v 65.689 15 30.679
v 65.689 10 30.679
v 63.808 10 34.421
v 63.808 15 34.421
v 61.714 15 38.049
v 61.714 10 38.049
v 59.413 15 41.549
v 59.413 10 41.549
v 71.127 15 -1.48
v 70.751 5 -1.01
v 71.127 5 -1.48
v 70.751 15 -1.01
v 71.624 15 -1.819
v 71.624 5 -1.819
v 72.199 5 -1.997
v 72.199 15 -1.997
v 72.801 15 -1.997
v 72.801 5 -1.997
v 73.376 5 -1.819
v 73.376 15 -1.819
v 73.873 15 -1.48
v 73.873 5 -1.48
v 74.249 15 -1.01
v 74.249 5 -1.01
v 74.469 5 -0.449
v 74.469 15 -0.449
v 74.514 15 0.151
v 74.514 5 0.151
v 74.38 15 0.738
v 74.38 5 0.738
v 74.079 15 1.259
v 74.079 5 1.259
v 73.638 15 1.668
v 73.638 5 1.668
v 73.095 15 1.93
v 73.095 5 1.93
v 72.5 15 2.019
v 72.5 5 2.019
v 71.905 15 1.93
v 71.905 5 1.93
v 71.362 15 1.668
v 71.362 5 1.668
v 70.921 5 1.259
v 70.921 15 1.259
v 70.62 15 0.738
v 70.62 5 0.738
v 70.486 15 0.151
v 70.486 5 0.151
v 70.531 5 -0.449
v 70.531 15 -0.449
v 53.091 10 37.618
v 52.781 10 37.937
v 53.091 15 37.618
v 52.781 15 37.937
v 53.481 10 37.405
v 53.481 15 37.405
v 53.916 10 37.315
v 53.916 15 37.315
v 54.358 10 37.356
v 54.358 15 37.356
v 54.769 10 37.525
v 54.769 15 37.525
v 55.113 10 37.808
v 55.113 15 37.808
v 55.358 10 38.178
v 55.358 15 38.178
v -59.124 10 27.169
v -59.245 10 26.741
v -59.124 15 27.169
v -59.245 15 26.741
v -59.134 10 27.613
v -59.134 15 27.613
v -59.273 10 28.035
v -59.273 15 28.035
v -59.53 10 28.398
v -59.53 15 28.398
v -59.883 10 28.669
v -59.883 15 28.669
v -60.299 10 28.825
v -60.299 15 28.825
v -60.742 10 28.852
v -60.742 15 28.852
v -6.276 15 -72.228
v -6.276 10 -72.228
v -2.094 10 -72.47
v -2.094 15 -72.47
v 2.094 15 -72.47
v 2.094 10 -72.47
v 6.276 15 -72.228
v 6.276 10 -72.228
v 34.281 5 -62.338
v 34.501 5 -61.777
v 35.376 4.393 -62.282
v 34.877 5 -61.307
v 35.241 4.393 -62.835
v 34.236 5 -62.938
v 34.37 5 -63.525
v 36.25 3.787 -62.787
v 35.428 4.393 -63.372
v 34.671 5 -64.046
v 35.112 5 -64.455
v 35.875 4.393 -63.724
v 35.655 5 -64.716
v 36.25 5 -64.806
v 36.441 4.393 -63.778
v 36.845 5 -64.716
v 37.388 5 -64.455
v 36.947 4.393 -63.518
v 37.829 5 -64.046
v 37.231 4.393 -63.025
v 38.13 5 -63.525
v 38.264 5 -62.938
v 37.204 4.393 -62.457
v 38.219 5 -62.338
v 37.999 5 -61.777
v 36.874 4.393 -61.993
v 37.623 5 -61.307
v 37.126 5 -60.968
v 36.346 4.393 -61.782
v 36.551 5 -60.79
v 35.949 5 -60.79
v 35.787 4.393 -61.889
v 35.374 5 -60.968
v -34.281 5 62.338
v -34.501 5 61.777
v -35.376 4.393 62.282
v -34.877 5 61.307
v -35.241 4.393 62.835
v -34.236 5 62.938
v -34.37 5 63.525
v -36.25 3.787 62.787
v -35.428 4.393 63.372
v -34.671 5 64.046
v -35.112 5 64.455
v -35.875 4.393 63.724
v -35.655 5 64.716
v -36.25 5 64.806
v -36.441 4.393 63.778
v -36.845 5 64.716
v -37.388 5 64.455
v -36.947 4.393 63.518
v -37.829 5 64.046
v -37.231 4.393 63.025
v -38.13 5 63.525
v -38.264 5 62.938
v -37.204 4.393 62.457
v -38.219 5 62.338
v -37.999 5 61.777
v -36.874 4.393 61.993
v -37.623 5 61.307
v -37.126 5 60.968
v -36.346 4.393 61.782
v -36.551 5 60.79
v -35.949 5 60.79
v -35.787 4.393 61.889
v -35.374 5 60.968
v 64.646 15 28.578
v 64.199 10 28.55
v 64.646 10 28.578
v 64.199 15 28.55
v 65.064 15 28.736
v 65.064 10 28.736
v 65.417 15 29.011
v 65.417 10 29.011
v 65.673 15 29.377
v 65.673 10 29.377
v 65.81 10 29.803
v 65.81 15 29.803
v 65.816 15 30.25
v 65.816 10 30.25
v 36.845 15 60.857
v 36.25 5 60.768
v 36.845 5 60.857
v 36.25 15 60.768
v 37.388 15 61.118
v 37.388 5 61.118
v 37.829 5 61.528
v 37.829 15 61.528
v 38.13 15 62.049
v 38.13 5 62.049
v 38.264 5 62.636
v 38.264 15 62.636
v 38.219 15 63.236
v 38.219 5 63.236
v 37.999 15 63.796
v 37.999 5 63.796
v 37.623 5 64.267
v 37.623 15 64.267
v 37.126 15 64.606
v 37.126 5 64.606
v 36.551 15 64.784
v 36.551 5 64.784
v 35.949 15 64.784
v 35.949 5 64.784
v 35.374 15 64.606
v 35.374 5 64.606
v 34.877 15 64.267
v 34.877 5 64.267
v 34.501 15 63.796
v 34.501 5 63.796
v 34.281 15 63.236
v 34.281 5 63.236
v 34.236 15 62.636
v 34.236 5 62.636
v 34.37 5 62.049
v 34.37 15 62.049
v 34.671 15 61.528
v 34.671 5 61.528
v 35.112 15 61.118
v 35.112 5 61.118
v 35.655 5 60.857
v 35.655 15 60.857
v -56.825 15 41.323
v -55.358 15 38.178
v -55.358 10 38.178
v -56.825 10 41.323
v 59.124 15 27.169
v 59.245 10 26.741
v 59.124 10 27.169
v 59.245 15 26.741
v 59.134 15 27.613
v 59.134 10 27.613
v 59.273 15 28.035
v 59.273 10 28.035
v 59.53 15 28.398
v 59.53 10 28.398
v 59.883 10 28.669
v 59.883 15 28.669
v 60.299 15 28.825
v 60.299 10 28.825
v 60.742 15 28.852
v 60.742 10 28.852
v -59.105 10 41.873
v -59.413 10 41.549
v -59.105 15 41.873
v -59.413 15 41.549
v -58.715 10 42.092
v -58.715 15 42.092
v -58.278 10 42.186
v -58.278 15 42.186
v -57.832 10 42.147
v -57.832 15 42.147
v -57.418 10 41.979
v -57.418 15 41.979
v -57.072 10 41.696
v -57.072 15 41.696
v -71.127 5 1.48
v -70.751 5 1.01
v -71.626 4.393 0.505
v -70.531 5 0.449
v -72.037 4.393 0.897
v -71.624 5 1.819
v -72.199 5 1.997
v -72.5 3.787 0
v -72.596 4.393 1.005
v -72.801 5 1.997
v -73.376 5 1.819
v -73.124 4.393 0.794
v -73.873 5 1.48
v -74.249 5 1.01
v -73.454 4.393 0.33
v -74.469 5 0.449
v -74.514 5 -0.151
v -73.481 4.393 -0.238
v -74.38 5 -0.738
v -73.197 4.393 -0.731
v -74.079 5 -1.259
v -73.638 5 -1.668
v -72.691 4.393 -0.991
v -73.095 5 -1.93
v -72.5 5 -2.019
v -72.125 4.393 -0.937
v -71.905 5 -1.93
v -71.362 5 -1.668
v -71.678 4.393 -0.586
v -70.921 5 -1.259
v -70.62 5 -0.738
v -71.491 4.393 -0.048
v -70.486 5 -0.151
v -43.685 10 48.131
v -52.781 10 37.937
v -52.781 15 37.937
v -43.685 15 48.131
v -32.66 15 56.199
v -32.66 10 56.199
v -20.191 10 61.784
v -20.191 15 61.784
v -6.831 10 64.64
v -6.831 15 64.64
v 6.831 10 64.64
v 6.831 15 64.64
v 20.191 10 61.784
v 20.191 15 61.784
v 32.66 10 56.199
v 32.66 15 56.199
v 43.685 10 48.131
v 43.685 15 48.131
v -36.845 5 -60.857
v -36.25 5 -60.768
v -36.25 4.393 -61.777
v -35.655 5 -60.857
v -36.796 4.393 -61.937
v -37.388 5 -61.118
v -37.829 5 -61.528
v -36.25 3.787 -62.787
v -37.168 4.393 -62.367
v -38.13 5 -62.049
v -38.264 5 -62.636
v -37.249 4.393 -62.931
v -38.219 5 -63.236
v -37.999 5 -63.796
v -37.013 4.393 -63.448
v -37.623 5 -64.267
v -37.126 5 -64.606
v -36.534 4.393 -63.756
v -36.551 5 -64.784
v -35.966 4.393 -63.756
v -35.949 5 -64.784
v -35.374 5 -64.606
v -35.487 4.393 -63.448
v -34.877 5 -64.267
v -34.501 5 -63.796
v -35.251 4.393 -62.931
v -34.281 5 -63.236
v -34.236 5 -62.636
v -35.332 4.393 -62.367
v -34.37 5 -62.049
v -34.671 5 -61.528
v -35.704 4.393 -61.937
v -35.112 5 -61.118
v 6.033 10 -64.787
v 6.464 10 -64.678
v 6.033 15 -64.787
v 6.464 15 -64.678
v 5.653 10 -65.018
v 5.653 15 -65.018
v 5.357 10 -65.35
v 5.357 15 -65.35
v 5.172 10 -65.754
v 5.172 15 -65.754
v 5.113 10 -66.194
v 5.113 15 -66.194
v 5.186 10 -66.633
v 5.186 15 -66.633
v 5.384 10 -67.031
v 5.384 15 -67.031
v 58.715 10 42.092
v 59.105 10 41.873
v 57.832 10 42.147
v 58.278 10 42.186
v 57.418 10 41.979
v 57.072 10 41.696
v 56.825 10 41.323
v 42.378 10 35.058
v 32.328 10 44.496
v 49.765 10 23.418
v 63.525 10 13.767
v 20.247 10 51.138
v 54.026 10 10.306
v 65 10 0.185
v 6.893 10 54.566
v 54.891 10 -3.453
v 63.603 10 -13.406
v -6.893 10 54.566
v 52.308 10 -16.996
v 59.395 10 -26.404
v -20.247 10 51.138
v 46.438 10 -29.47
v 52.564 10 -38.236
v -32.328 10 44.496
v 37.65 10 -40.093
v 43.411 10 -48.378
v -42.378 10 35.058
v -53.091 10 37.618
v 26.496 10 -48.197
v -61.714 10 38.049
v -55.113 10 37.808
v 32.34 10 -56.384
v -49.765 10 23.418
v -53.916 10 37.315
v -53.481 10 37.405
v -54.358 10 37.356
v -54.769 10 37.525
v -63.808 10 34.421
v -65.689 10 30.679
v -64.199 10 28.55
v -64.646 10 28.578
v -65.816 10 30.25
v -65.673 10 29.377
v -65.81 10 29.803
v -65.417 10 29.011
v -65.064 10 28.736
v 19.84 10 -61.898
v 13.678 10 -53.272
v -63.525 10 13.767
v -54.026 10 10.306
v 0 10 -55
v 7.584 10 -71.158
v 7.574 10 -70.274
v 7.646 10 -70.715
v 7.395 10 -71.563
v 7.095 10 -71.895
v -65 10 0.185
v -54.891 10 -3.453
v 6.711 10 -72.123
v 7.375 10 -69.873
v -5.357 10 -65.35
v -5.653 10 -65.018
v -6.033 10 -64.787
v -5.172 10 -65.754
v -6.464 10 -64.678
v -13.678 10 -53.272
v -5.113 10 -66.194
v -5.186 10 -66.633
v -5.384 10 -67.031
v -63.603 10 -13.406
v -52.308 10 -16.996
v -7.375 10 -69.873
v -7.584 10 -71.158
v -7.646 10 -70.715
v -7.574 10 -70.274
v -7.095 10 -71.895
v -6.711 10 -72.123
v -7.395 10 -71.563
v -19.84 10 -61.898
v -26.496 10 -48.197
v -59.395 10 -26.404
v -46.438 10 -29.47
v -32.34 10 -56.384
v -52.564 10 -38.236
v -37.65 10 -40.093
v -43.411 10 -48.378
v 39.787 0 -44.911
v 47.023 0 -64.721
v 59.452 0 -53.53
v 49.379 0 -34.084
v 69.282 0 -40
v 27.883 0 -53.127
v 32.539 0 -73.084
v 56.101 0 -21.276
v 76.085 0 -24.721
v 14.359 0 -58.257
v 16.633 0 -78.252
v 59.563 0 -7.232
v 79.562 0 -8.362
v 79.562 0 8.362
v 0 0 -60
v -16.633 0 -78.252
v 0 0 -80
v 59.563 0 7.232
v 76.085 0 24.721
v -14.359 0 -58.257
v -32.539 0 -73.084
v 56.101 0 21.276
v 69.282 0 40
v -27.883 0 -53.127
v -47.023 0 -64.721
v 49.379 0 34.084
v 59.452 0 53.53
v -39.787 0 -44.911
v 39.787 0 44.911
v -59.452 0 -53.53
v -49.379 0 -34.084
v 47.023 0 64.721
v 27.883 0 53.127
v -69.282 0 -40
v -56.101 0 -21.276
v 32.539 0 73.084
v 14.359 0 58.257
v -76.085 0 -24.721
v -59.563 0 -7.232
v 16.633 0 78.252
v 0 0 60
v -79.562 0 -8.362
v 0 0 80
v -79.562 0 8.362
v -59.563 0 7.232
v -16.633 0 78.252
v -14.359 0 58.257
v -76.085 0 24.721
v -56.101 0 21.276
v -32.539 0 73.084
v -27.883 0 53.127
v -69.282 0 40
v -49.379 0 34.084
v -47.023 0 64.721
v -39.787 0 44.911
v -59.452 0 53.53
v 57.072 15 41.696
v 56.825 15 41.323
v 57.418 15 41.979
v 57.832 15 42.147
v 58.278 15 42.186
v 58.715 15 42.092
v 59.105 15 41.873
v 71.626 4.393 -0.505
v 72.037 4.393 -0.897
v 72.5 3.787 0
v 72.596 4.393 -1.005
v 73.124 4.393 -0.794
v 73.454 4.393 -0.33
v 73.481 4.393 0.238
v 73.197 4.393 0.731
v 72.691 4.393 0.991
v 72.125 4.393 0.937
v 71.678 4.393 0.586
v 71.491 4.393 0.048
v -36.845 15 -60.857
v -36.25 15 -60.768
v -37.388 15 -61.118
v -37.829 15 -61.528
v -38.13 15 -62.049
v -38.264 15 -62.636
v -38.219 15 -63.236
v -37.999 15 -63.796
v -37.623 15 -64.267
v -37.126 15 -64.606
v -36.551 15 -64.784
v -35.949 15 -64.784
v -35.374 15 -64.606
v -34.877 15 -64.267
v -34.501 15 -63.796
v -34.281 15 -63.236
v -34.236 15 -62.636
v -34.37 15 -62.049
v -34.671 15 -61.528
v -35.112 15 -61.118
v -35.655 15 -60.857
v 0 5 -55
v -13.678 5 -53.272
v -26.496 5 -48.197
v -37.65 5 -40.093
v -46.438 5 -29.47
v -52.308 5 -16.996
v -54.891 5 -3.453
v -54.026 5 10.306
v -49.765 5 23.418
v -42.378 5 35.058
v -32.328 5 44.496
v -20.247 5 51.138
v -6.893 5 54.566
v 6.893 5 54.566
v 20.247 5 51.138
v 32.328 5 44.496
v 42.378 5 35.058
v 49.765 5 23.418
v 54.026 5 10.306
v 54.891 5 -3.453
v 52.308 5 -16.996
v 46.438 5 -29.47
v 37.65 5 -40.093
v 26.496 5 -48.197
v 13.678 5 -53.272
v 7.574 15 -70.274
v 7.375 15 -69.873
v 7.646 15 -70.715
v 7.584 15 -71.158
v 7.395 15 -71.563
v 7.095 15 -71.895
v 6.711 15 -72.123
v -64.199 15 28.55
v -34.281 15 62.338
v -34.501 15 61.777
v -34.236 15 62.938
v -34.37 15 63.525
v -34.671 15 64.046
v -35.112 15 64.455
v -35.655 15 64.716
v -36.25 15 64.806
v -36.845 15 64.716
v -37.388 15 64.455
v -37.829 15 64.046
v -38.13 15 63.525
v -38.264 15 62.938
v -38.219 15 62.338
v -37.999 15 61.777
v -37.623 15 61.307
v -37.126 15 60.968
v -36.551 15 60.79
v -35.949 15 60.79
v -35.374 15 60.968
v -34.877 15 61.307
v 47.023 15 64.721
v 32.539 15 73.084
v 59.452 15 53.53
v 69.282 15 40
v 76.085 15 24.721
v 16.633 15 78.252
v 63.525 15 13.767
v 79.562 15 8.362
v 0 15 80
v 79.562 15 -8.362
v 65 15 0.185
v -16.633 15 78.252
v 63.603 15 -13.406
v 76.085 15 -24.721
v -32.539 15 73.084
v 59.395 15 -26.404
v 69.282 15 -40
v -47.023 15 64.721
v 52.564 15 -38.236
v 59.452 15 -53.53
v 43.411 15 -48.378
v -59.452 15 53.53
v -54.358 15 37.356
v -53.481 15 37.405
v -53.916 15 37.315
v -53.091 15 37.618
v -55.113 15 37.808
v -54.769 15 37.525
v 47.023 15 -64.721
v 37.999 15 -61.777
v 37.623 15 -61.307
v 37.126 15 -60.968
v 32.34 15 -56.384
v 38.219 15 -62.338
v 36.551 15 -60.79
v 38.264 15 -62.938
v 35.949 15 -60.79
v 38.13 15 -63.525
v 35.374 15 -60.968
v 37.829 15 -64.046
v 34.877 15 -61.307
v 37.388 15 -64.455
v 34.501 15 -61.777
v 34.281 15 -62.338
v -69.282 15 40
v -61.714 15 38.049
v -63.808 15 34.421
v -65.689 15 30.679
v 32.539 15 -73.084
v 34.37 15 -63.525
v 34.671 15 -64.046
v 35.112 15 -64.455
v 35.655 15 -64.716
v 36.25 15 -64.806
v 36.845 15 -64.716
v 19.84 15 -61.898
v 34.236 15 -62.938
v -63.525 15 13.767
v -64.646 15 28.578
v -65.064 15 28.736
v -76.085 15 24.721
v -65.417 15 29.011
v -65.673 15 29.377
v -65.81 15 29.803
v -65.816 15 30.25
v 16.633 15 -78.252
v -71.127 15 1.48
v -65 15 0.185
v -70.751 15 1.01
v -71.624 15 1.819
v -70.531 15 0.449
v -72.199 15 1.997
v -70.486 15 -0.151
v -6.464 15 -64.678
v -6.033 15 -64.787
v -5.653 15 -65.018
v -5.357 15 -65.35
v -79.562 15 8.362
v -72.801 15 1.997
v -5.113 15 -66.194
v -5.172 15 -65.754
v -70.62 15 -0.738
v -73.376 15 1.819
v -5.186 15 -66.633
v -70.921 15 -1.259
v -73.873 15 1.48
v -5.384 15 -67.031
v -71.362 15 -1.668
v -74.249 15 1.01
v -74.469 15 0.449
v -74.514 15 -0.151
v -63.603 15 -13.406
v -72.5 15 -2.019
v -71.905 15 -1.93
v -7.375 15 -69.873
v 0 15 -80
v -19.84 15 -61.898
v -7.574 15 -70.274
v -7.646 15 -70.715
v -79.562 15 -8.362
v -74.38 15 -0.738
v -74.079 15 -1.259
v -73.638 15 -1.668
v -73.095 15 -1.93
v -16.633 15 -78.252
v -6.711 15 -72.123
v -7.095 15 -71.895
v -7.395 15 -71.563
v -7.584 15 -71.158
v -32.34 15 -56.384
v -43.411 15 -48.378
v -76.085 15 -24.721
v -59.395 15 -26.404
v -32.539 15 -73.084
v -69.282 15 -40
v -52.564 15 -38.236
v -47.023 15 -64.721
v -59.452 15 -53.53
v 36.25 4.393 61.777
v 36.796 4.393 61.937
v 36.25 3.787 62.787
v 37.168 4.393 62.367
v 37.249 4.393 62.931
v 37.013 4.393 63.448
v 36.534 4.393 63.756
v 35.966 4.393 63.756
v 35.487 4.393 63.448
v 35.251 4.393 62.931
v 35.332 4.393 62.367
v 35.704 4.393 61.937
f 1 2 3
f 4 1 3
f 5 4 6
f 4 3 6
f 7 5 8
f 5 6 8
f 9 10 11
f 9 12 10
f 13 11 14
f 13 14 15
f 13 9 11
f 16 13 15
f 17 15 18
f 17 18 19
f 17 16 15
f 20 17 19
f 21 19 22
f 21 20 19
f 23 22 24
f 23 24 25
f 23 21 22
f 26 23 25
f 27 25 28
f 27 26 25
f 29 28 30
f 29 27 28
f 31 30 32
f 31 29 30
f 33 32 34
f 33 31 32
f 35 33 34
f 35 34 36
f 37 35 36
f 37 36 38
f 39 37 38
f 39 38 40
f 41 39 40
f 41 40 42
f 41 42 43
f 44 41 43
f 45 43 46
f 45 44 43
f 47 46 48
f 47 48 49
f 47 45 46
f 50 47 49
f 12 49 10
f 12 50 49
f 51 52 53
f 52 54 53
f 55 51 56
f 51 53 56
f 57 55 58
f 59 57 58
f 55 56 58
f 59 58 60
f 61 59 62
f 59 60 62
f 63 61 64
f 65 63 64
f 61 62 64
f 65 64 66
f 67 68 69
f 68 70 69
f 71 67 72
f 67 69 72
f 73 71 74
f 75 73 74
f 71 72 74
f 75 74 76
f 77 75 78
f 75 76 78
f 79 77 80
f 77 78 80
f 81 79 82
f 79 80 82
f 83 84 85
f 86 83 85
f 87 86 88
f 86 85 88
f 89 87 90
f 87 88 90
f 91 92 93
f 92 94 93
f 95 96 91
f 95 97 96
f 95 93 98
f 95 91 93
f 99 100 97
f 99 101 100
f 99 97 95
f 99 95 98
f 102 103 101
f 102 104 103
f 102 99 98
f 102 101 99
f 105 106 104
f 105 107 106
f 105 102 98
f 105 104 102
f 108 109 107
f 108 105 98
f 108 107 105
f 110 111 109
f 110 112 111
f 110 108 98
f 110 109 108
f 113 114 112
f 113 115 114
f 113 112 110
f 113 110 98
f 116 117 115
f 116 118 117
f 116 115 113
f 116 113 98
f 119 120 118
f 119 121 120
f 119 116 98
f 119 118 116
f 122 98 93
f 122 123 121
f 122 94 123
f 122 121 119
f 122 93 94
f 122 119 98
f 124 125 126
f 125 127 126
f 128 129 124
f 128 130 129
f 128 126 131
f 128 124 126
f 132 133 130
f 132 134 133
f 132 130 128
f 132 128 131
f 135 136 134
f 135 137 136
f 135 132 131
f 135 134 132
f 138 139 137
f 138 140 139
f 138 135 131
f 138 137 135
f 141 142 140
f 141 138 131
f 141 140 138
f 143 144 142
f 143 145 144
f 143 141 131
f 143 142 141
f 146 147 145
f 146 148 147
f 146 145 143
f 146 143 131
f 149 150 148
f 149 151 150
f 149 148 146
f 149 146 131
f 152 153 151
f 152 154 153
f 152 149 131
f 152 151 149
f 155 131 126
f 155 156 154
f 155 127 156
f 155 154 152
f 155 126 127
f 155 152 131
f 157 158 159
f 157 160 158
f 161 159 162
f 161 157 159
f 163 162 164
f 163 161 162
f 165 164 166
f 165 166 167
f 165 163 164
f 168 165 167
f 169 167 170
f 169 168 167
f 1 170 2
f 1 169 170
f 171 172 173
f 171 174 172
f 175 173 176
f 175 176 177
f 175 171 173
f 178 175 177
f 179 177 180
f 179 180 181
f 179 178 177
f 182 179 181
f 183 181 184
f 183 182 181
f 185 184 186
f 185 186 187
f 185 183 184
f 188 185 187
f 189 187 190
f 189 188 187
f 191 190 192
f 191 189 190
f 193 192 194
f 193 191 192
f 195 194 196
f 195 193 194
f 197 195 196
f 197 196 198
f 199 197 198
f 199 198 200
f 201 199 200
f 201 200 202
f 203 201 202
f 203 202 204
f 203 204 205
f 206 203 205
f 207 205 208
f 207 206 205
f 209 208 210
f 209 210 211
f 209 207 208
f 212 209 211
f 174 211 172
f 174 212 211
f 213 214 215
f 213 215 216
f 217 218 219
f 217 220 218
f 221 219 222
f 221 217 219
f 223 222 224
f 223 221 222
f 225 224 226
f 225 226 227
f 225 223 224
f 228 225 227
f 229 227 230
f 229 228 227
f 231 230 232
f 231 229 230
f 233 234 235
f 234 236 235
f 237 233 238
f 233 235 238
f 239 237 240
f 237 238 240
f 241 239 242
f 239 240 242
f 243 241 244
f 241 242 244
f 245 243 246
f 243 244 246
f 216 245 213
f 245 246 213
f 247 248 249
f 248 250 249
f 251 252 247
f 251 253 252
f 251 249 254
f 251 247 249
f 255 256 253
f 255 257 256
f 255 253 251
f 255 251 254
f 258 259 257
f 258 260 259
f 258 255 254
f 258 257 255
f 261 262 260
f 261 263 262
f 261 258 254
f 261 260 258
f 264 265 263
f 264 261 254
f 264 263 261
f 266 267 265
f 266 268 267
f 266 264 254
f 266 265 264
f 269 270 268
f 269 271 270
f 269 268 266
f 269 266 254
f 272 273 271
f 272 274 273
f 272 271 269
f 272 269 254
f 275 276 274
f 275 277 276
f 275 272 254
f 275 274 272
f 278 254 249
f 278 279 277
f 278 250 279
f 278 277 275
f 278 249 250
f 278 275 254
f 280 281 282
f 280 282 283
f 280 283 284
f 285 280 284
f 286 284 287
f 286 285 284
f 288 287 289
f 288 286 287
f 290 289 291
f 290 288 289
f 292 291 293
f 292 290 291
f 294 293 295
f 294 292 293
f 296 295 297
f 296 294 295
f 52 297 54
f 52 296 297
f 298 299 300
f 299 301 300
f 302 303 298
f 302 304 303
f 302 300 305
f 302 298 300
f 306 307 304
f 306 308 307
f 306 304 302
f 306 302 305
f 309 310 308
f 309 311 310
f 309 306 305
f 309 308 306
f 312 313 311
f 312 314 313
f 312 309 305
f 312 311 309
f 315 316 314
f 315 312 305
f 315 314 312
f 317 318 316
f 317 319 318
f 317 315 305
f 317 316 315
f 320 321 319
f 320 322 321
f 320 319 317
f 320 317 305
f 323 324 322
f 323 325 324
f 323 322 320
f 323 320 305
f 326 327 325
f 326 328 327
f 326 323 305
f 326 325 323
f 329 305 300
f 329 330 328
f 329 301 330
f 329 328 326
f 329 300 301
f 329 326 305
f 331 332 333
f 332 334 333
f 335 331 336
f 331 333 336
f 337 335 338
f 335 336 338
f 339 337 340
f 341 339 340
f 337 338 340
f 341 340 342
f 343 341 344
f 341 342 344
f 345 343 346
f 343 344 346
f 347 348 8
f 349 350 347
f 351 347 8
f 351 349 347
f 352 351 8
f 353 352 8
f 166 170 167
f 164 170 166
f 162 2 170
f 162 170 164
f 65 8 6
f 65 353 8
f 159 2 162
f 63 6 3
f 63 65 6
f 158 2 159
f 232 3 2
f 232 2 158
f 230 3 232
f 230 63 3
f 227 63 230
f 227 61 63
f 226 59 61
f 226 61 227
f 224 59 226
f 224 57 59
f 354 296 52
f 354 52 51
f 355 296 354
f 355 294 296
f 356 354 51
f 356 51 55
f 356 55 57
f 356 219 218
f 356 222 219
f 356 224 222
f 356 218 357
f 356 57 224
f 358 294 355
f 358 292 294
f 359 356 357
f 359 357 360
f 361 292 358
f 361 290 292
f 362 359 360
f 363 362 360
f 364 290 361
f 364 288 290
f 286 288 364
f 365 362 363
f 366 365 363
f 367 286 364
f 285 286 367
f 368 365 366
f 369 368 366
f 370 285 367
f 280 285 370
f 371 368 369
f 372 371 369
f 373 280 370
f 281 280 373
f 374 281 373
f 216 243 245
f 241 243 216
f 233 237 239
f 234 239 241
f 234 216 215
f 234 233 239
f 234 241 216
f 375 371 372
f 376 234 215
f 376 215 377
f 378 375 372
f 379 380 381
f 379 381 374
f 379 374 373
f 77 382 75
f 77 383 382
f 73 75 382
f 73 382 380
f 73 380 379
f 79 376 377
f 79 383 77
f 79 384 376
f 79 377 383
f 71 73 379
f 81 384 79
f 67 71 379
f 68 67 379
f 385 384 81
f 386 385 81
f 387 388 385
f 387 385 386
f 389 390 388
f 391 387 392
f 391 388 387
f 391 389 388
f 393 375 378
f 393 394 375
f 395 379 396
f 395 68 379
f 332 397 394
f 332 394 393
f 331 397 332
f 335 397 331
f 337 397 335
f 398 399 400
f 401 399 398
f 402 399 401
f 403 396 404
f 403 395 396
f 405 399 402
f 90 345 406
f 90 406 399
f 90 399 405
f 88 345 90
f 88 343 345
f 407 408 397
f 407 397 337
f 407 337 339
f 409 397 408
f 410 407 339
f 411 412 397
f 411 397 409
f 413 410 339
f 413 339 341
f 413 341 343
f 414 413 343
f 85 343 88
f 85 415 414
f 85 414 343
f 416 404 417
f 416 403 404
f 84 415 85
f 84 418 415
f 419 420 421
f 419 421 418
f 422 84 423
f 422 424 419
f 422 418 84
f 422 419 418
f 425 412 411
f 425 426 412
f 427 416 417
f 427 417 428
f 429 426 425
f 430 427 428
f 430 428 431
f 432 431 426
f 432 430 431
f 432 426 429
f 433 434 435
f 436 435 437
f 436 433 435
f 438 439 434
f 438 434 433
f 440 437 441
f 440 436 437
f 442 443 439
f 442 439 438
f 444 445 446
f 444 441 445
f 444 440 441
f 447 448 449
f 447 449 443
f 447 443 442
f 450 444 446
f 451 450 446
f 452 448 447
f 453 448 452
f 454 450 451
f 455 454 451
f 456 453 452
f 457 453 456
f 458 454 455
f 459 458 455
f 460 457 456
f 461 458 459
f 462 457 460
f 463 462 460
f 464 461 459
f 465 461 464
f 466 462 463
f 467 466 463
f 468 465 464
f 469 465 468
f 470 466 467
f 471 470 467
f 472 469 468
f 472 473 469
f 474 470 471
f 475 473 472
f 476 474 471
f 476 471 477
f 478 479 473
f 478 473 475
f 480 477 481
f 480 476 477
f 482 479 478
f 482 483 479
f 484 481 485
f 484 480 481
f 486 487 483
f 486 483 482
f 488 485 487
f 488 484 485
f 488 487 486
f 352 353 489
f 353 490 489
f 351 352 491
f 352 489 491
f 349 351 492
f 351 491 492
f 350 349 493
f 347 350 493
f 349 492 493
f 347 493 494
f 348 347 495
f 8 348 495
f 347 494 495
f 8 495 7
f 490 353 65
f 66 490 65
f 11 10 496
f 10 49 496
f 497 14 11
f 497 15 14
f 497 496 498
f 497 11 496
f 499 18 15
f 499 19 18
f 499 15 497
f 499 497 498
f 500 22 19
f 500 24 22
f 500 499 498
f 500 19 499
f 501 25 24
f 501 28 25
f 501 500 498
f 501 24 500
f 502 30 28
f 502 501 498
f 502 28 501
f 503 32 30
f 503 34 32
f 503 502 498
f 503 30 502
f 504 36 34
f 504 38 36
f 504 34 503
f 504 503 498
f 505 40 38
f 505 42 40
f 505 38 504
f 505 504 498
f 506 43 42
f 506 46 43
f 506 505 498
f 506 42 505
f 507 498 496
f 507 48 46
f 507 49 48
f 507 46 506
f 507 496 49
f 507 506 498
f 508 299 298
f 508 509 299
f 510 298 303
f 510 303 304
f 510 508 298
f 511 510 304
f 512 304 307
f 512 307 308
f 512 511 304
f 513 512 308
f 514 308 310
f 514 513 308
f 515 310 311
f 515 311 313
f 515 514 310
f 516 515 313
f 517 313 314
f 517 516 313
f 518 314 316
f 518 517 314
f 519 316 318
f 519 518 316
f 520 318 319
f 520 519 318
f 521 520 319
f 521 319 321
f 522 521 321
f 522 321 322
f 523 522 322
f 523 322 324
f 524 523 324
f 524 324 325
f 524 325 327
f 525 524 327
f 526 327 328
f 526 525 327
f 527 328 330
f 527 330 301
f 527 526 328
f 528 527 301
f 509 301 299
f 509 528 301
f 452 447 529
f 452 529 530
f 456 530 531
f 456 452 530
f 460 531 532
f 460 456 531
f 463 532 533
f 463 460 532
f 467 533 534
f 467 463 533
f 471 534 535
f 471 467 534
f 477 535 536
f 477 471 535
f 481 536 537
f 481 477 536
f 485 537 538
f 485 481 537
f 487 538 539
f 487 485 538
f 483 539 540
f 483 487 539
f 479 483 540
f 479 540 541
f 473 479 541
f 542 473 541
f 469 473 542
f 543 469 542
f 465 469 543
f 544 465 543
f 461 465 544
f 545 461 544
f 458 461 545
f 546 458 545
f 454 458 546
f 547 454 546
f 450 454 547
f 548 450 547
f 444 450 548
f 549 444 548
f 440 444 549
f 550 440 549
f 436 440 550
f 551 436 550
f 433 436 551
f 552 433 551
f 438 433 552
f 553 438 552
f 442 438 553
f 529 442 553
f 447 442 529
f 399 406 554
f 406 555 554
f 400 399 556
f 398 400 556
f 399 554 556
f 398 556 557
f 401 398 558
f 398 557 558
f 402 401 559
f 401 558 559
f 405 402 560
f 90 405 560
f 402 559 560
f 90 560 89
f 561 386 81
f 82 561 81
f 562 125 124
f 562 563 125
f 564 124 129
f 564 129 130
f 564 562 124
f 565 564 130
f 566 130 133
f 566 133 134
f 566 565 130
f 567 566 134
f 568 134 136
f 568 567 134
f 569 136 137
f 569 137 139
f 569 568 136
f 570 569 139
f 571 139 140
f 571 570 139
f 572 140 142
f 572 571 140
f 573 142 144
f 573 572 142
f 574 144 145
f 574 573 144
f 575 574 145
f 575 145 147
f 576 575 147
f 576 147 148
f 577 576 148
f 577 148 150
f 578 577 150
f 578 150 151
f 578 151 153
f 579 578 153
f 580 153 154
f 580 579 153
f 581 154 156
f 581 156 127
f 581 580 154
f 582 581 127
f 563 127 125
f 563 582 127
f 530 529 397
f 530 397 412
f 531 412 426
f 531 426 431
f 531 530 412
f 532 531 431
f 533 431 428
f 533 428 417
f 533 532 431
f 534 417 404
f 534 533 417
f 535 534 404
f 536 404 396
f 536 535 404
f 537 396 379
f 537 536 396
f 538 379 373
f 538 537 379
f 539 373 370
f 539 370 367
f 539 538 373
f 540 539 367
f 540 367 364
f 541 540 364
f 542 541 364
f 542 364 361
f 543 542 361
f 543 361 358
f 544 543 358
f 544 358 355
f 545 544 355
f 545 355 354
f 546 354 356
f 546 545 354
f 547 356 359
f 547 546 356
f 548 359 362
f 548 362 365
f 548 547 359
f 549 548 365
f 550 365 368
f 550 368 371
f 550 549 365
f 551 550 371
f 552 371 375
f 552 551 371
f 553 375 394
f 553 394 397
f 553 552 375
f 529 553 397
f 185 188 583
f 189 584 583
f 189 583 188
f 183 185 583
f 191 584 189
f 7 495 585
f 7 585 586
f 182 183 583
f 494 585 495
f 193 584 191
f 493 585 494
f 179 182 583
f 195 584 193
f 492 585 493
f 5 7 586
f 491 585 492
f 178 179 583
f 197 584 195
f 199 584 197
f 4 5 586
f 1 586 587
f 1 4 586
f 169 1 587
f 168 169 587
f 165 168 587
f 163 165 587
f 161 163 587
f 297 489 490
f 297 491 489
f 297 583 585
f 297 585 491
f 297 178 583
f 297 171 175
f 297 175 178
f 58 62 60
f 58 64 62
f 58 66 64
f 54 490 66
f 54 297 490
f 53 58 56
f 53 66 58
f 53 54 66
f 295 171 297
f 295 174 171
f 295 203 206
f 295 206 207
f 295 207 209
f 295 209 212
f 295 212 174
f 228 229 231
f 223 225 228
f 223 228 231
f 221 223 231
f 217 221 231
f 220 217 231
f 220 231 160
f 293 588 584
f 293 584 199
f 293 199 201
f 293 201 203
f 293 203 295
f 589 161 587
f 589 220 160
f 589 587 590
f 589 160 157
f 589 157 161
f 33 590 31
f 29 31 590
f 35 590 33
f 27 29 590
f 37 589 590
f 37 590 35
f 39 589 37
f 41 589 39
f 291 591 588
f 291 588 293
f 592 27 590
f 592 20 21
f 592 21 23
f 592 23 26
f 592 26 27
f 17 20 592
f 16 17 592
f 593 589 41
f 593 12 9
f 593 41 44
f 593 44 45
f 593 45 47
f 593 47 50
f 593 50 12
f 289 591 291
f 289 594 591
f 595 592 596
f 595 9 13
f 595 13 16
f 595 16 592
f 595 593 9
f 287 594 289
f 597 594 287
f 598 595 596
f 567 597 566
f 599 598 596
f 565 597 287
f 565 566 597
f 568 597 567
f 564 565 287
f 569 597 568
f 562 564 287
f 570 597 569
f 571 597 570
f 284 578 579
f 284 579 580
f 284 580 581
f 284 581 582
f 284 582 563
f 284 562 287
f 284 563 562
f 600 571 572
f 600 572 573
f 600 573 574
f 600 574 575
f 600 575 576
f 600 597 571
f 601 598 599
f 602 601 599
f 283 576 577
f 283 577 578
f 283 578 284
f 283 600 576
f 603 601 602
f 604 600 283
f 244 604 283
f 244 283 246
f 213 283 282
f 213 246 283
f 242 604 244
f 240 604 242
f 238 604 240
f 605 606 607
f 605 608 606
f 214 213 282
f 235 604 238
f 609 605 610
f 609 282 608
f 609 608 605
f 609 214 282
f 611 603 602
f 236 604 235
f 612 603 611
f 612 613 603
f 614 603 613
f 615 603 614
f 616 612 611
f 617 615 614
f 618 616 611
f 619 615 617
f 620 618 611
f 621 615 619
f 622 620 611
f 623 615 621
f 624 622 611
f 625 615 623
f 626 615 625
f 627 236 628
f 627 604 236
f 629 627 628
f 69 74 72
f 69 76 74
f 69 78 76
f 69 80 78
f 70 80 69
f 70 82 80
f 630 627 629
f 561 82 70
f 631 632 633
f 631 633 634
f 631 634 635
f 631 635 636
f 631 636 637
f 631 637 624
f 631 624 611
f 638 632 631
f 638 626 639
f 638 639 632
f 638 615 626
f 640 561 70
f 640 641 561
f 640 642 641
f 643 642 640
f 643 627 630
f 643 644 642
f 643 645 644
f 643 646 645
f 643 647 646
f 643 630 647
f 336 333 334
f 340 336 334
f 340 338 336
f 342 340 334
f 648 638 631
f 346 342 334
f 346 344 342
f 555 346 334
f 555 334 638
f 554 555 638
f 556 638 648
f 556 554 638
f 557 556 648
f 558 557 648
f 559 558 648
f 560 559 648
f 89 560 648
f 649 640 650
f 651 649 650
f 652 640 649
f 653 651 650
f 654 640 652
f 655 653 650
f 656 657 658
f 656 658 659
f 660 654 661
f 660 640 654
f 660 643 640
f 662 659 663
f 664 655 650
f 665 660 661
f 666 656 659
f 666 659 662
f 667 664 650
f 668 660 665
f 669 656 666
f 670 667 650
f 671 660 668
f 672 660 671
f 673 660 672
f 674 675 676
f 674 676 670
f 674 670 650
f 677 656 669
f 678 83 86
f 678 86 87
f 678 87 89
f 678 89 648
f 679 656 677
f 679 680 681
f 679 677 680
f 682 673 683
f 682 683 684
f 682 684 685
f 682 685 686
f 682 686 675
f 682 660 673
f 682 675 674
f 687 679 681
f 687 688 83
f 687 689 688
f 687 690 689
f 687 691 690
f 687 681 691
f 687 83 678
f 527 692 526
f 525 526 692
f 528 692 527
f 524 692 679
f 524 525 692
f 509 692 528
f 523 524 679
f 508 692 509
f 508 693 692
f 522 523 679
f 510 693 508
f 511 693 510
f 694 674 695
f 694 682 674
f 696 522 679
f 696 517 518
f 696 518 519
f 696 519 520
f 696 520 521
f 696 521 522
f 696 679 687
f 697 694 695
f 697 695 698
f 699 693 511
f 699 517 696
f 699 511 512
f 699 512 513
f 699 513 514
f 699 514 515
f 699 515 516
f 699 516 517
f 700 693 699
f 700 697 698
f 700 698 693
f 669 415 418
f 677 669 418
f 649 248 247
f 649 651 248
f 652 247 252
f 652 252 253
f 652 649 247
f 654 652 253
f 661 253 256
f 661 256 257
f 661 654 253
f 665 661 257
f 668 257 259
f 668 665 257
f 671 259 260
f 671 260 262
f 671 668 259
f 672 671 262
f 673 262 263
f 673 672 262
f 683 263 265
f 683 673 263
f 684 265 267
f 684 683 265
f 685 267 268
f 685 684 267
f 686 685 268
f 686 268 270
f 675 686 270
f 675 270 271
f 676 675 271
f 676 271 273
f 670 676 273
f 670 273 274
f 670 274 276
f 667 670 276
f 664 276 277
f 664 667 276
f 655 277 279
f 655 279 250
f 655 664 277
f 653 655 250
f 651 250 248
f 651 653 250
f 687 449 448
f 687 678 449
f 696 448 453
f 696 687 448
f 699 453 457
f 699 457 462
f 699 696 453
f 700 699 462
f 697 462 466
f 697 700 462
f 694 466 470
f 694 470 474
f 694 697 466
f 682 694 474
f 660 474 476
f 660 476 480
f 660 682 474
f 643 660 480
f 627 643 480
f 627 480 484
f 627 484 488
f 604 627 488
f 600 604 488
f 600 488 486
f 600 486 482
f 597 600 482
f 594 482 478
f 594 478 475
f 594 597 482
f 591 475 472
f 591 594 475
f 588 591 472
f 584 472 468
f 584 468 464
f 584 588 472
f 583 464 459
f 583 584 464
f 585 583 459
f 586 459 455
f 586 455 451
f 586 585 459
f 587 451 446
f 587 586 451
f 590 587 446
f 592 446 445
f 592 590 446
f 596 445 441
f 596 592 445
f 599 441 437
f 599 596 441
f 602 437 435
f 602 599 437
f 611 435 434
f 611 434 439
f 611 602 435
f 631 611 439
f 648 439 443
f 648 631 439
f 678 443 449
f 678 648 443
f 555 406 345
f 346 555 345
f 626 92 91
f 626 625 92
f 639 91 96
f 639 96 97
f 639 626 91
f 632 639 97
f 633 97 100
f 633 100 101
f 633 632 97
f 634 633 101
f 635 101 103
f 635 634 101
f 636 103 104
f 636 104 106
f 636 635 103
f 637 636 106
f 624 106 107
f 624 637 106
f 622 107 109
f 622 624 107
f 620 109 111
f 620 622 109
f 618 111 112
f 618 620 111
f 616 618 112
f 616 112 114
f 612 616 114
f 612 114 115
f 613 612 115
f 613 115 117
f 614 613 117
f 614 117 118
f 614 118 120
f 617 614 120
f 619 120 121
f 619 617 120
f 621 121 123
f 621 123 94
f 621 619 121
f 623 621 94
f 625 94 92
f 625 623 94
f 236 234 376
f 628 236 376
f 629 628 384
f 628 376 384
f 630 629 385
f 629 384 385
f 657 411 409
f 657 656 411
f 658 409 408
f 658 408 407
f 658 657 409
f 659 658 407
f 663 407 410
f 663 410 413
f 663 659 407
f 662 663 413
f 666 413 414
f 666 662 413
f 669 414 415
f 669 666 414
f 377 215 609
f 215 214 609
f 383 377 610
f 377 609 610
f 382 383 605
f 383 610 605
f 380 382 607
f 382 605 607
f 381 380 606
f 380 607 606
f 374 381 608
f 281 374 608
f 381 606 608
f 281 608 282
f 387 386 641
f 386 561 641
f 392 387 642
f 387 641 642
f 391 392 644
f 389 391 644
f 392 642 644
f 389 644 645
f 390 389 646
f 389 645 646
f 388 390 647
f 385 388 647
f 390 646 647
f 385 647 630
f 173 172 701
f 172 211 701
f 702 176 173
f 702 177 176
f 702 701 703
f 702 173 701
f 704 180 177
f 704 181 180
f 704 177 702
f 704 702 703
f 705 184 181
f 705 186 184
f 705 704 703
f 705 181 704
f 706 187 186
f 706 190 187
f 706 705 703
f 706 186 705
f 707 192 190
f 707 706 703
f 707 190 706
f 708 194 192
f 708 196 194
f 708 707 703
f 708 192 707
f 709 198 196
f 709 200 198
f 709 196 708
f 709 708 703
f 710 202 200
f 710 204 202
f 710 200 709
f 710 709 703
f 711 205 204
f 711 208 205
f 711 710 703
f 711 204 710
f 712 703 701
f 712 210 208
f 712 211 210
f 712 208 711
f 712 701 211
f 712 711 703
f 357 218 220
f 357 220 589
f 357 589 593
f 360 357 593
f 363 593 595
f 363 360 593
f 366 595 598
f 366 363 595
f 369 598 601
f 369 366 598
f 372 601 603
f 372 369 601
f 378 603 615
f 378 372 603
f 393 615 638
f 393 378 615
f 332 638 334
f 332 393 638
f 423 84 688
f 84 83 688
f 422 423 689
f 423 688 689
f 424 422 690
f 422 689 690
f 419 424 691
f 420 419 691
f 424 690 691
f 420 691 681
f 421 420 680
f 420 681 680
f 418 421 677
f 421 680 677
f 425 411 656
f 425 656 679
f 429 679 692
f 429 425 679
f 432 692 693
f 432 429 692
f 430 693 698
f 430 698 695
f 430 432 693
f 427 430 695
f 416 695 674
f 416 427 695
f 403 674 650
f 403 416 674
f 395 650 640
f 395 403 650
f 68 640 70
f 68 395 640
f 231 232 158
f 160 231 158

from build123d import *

# Parameters (mm, degrees)
CUT_EXTRUDE1_START       = -5
CUT_EXTRUDE1_DEPTH       = 5
FILLET1_R                = 1.5
CHAMFER1_SIZE            = 5
CIRPATTERN2_COUNT        = 3
FILLET1_OF_CIRPATTERN2_R = 1.5
CIRPATTERN3_COUNT        = 6


with BuildPart() as part:
    # Sketch2 → Revolve1 (revolve)
    with BuildSketch(Plane(origin=(0, 0, 0), x_dir=(0, 0, -1), z_dir=(1, 0, 0)), mode=Mode.PRIVATE) as revolve1_sk:
        Polygon((-55, 0), (-80, 0), (-80, 15), (-65, 15), (-65, 10), (-55, 10), align=None)
    revolve(revolve1_sk.sketch.rotate(Axis((0, -0.75, 0), (0, 1, 0)), 180), axis=Axis((0, -0.75, 0), (0, 1, 0)))

    # Sketch4 → Cut-Extrude1 (cut)
    with BuildSketch(Plane(origin=(0, 15, 0), x_dir=(1, 0, 0), z_dir=(0, 1, 0)).offset(CUT_EXTRUDE1_START)):
        with BuildLine():
            Line((-3.881158746, 64.88402428), (-8.835527397, 71.959595994))
            ThreePointArc((-8.835527397, 71.959595994), (0, 72.5), (8.835527397, 71.959595994))
            Line((8.835527397, 71.959595994), (3.881158746, 64.88402428))
            ThreePointArc((3.881158746, 64.88402428), (0, 65), (-3.881158746, 64.88402428))
        make_face()
    cut_extrude1 = extrude(amount=CUT_EXTRUDE1_DEPTH, mode=Mode.SUBTRACT)

    # Fillet1
    fillet1_edges = [part.edges().sort_by_distance(p)[0] for p in [
        (3.881158746, 12.5, -64.88402428),
        (-3.881158746, 12.5, -64.88402428),
        (-8.835527397, 12.5, -71.959595994),
        (8.835527397, 12.5, -71.959595994),
    ]]
    fillet(fillet1_edges, radius=FILLET1_R)

    # Chamfer1
    chamfer1_edges = [part.edges().sort_by_distance(p)[0] for p in [
        (0, 0, 55),
    ]]
    chamfer(chamfer1_edges, length=CHAMFER1_SIZE)

    # CirPattern2: Cut-Extrude1 ×3 about axis
    cirpattern2_axis = Axis((0, 0, 0), (0, 1, 0))
    for i in range(1, CIRPATTERN2_COUNT):
        add(cut_extrude1.rotate(cirpattern2_axis, i * 360 / CIRPATTERN2_COUNT), mode=Mode.SUBTRACT)

    # Fillet1 of CirPattern2
    fillet1_of_cirpattern2_edges = [part.edges().sort_by_distance(p)[0] for p in [
        (-58.131792699, 12.5, 29.08083007),
        (-54.250633954, 12.5, 35.80319421),
        (-57.901074478, 12.5, 43.631589179),
        (-66.736601875, 12.5, 28.328006815),
        (54.250633954, 12.5, 35.80319421),
        (58.131792699, 12.5, 29.08083007),
        (66.736601875, 12.5, 28.328006815),
        (57.901074478, 12.5, 43.631589179),
    ]]
    fillet(fillet1_of_cirpattern2_edges, radius=FILLET1_OF_CIRPATTERN2_R)

    # Sketch7 → #10-32 Tapped Hole1 (revolve, cut)
    with BuildSketch(Plane(origin=(-36.25, 15, -62.786841774), x_dir=(0, 0, 1), z_dir=(1, 0, 0))):
        Polygon((0, 0), (0, 11.213317848), (2.0193, 10), (2.0193, 0), align=None)
    f_10_32_tapped_hole1 = revolve(axis=Axis((-36.25, 21.35, -62.786841774), (0, -1, 0)), mode=Mode.SUBTRACT)

    # CirPattern3: #10-32 Tapped Hole1 ×6 about axis
    cirpattern3_axis = Axis((0, 0, 0), (0, 1, 0))
    for i in range(1, CIRPATTERN3_COUNT):
        add(f_10_32_tapped_hole1.rotate(cirpattern3_axis, i * 360 / CIRPATTERN3_COUNT), mode=Mode.SUBTRACT)


solid = part.part
